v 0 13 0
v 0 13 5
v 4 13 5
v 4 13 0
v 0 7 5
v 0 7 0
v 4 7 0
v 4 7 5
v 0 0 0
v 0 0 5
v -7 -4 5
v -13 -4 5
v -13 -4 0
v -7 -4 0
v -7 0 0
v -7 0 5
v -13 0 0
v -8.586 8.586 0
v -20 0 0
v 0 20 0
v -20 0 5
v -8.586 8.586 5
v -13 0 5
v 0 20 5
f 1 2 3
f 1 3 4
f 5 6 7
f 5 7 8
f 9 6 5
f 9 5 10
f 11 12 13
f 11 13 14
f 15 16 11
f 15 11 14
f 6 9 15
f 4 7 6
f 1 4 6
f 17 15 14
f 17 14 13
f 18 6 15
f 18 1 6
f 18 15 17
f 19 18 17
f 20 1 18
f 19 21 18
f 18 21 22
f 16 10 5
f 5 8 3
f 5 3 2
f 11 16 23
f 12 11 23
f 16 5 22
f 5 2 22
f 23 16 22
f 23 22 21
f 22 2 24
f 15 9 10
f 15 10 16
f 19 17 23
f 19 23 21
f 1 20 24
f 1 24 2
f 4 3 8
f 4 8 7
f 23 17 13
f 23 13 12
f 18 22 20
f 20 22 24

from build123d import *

# Parameters (mm, degrees)
EXTRUDE_1_DEPTH     = 5
CUT_EXTRUDE_1_DEPTH = 5
EXTRUDE_2_DEPTH     = 5
EXTRUDE_3_DEPTH     = 5
SKETCH_5_W          = 6
SKETCH_5_H          = 5
CUT_EXTRUDE_2_DEPTH = 1
SKETCH_6_W          = 5
SKETCH_6_H          = 6
CUT_EXTRUDE_3_DEPTH = 1


with BuildPart() as part:
    # 草图1 → 凸台-拉伸1 (new body)
    with BuildSketch(Plane.XY):
        Polygon((0, 0), (-20, 0), (0, 20), align=None)
    extrude(amount=EXTRUDE_1_DEPTH)

    # 草图2 → 切除-拉伸1 (cut)
    with BuildSketch(Plane.XY.offset(5)):
        Polygon((-8.585786438, 8.585786438), (-10, 10), (-20, 0), align=None)
        Polygon((-8.585786438, 8.585786438), (0, 20), (-10, 10), align=None)
    extrude(amount=-CUT_EXTRUDE_1_DEPTH, mode=Mode.SUBTRACT)

    # 草图3 → 凸台-拉伸2 (add)
    with BuildSketch(Plane.XZ):
        Polygon((-10, 0), (-13, 0), (-13, 5), (-7, 5), (-7, 0), align=None)
    extrude(amount=EXTRUDE_2_DEPTH)

    # 草图4 → 凸台-拉伸3 (add)
    with BuildSketch(Plane(origin=(0, 0, 0), x_dir=(0, 0, -1), z_dir=(1, 0, 0))):
        Polygon((0, 10), (0, 7), (-5, 7), (-5, 13), (0, 13), align=None)
    extrude(amount=EXTRUDE_3_DEPTH)

    # 草图5 → 切除-拉伸2 (cut)
    with BuildSketch(Plane.XZ.offset(5)):
        with Locations((-10, 2.5)):
            Rectangle(SKETCH_5_W, SKETCH_5_H)
    extrude(amount=-CUT_EXTRUDE_2_DEPTH, mode=Mode.SUBTRACT)

    # 草图6 → 切除-拉伸3 (cut)
    with BuildSketch(Plane(origin=(5, 0, 0), x_dir=(0, 0, -1), z_dir=(1, 0, 0))):
        with Locations((-2.5, 10)):
            Rectangle(SKETCH_6_W, SKETCH_6_H)
    extrude(amount=-CUT_EXTRUDE_3_DEPTH, mode=Mode.SUBTRACT)


solid = part.part
